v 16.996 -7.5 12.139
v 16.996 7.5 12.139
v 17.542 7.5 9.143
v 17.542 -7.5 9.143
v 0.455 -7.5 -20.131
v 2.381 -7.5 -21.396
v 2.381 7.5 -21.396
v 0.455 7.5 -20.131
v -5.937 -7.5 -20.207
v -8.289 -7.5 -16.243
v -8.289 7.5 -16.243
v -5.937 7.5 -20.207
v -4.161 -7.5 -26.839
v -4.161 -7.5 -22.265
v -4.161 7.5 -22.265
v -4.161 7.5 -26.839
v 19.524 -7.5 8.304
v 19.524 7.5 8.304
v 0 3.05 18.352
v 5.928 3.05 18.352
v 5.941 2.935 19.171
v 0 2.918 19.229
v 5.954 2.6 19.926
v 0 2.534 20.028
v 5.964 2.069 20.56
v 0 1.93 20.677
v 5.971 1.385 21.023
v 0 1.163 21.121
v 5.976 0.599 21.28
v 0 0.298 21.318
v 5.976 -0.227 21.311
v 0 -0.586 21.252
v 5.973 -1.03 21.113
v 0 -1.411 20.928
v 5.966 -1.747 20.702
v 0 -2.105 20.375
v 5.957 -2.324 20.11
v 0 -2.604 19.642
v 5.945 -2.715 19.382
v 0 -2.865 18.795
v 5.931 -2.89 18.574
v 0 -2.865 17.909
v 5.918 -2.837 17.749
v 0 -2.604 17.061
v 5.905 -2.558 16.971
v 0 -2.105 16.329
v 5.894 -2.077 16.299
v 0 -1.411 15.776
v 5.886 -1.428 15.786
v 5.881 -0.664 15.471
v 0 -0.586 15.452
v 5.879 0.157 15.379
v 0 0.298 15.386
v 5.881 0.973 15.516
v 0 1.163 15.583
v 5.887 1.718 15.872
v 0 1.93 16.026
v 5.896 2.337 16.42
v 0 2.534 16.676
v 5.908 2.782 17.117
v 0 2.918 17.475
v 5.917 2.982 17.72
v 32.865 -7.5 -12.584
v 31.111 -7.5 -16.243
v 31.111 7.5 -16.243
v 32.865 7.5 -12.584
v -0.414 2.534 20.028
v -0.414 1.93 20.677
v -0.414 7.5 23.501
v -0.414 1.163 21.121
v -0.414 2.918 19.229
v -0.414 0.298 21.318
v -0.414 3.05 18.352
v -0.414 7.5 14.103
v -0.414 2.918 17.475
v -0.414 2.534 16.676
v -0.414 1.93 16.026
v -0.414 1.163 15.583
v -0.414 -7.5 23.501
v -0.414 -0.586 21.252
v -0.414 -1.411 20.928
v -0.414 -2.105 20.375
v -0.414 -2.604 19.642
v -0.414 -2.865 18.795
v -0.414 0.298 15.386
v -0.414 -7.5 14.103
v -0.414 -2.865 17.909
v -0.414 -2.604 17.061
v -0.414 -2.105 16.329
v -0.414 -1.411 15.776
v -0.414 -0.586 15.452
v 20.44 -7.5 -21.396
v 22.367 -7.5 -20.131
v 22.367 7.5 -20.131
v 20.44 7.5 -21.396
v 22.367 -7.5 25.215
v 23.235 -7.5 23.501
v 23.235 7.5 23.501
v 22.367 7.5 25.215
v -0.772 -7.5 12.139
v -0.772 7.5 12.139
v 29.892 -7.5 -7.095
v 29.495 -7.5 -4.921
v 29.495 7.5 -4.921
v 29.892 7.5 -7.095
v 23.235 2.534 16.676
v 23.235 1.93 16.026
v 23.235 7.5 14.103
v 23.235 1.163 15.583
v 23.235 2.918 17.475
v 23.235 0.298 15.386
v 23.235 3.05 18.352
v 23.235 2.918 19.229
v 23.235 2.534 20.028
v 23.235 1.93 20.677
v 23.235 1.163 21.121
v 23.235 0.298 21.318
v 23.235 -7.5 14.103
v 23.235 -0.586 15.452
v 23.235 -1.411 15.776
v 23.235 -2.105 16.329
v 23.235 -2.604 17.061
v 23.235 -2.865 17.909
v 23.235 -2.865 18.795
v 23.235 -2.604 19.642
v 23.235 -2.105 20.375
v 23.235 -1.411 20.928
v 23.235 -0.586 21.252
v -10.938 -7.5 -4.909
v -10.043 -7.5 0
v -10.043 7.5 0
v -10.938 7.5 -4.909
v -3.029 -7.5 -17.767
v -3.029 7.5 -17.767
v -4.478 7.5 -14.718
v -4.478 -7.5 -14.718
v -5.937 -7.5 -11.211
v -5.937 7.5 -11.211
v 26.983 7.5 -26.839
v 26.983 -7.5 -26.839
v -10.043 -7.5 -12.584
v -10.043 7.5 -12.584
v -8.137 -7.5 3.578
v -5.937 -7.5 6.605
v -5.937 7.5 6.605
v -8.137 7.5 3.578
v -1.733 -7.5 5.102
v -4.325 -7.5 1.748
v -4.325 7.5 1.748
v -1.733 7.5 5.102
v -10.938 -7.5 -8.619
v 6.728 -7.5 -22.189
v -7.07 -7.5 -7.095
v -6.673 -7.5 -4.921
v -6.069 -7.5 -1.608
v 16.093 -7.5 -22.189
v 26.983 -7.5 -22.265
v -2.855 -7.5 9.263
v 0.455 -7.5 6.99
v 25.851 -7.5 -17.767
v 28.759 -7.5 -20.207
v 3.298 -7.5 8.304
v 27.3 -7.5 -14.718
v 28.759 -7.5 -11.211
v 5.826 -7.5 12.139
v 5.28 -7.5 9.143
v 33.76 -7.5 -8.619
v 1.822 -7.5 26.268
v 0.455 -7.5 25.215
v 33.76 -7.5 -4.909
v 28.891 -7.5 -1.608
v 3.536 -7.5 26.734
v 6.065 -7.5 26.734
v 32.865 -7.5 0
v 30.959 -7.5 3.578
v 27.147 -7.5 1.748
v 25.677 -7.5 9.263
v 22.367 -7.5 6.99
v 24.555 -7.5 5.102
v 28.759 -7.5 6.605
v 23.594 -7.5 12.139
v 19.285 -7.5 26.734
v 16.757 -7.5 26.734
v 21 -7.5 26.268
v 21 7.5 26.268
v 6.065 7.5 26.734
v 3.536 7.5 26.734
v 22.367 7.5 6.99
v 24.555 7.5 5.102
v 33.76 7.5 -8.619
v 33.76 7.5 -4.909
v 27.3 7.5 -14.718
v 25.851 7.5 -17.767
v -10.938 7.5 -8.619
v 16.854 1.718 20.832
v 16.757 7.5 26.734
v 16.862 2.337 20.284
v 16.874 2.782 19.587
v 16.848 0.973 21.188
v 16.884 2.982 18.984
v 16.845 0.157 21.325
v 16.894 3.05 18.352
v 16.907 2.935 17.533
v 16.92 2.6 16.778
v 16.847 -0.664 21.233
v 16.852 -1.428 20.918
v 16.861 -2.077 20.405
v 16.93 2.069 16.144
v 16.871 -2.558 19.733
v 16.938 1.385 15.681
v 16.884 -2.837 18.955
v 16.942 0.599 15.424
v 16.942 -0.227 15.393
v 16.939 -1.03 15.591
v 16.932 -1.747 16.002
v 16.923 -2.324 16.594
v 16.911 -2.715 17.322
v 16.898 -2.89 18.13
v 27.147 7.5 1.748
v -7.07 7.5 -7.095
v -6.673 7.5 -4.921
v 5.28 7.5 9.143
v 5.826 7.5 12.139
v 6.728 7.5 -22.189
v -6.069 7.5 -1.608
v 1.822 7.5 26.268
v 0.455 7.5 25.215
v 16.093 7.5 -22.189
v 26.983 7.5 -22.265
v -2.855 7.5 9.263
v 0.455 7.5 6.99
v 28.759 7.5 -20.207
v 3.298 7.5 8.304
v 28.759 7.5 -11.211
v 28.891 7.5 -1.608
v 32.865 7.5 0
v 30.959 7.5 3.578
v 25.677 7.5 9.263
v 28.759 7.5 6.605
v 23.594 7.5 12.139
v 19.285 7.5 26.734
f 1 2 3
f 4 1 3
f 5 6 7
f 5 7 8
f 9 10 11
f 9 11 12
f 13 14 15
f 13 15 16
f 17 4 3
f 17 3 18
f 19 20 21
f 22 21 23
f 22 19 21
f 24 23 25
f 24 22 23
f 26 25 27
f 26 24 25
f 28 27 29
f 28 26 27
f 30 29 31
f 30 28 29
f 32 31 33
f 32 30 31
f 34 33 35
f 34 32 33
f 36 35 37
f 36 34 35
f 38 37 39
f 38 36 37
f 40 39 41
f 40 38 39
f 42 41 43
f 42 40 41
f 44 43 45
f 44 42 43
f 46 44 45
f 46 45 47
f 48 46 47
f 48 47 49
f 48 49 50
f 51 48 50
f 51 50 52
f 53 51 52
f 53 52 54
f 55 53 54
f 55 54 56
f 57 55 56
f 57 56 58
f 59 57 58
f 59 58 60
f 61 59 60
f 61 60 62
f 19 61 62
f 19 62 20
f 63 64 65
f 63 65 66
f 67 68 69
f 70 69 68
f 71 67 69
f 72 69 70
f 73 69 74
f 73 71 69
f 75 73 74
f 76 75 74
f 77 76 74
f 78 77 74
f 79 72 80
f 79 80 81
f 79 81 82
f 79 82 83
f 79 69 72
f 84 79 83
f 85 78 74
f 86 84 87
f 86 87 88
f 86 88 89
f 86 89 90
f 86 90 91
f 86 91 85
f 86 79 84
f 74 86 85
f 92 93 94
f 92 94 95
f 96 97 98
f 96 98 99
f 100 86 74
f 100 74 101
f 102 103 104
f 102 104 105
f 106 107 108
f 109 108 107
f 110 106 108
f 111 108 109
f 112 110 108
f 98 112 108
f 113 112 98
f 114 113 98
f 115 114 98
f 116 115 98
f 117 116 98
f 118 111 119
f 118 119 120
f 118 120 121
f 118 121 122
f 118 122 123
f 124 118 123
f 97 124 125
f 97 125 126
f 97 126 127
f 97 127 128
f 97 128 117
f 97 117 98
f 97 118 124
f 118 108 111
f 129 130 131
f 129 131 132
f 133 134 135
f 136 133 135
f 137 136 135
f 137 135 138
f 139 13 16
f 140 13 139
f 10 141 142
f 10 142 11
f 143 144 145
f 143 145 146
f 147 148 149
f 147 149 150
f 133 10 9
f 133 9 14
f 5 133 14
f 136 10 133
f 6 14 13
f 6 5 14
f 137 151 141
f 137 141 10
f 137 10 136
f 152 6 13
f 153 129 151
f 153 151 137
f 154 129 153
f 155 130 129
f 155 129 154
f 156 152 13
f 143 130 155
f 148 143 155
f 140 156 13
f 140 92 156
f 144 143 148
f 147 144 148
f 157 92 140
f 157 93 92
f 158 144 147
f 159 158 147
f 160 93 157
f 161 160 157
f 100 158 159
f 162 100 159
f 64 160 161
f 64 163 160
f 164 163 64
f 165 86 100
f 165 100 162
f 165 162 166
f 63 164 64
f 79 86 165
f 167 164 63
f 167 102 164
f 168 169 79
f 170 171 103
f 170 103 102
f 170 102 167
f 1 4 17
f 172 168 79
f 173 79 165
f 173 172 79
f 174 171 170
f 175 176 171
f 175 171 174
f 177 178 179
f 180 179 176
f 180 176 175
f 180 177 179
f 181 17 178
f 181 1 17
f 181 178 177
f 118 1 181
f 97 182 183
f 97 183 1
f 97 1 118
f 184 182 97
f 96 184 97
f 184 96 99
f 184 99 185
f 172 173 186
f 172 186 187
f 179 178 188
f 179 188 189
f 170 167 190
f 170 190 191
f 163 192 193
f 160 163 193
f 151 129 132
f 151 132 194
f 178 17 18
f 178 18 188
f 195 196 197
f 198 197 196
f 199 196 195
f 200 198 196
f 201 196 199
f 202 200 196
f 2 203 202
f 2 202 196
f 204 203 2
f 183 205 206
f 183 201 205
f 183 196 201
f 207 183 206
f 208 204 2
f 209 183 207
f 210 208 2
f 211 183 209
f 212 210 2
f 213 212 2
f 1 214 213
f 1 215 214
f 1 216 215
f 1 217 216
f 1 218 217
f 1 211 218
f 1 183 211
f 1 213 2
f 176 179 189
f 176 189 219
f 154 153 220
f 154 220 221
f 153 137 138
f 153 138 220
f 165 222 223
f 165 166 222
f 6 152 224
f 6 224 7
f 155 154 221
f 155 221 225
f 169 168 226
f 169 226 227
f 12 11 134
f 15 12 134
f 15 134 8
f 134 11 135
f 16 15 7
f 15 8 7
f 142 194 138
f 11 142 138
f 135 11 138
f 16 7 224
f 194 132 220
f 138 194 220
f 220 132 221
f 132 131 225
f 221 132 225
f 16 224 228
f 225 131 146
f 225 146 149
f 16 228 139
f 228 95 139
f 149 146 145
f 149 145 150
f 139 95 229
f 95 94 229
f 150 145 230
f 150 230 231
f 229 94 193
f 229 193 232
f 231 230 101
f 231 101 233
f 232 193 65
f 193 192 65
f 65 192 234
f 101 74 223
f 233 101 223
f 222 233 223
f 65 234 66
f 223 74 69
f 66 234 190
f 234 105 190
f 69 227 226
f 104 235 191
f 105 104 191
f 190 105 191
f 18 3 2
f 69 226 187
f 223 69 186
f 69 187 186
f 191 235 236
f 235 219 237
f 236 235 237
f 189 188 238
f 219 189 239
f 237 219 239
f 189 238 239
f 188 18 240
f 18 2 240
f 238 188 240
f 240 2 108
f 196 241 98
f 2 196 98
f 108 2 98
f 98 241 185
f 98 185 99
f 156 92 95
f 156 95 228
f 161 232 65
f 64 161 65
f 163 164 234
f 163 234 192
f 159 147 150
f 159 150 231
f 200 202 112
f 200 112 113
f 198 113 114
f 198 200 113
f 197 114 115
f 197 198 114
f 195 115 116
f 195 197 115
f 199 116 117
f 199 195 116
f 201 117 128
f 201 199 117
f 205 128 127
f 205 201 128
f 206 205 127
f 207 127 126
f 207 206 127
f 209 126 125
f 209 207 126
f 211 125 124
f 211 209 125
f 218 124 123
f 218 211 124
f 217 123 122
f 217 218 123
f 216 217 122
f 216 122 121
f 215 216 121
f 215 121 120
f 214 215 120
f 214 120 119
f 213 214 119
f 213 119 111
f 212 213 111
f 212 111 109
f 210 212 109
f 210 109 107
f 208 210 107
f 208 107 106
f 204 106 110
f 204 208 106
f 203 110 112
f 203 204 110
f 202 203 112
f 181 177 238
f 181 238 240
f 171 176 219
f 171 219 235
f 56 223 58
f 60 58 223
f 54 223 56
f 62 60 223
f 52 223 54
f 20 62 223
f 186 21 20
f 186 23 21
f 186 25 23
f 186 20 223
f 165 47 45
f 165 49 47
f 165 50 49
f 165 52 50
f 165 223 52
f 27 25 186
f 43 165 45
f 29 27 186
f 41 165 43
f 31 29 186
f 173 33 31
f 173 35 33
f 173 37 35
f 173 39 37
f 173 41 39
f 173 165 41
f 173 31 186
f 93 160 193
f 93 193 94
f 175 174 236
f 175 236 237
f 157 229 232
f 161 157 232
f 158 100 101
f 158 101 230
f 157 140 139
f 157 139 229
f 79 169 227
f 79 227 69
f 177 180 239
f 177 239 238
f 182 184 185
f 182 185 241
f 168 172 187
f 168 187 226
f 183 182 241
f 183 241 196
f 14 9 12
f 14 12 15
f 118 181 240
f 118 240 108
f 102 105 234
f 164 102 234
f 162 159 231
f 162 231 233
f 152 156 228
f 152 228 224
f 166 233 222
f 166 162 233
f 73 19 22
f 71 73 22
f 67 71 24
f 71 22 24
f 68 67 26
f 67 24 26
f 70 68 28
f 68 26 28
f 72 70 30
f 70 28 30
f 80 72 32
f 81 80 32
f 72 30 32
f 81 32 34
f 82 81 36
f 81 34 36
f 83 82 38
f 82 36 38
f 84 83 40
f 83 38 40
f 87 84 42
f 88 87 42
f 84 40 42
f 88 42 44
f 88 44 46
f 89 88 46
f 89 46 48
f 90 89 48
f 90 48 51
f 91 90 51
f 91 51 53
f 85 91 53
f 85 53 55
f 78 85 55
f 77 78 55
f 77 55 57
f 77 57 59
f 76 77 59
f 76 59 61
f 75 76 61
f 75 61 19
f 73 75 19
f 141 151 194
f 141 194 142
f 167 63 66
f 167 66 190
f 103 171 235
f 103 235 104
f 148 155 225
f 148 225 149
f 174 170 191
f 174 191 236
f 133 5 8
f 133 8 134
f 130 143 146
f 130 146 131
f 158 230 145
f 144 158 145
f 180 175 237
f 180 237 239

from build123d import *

# Parameters (mm, degrees)
F1_DEPTH = 7.5
F2_R     = 2.974485
F3_DEPTH = 33.760661
F4_R     = 2.974485
F5_DEPTH = 10.938791


with BuildPart() as f1:
    # F0 (on Front) → F1 (new body, symmetric)
    with BuildSketch(Plane.XZ):
        Polygon((5.826252, 12.139047), (6.064818, 26.734496), (3.536387, 26.734496), (1.821829, 26.267877), (0.454524, 25.215268), (-0.413607, 23.500709), (-0.413607, 14.103194), (-0.771711, 12.139047), (-2.855225, 9.263365), (-5.937089, 6.604715), (-8.137005, 3.577773), (-10.042827, 0), (-10.937791, -4.908744), (-10.937791, -8.619478), (-10.042827, -12.583584), (-8.289473, -16.242759), (-5.937089, -20.206865), (-4.16116, -22.265492), (-4.16116, -26.83912), (11.410935, -26.83912), (11.410935, -22.188919), (6.728393, -22.188919), (2.381469, -21.396385), (0.454524, -20.130632), (-3.029408, -17.767416), (-4.477831, -14.718102), (-5.937089, -11.211392), (-7.069747, -7.09482), (-6.673481, -4.921359), (-6.069345, -1.607767), (-4.325366, 1.748186), (-1.733449, 5.10243), (0.454524, 6.989942), (3.297916, 8.304209), (5.279969, 9.14277), align=None)
        Polygon((16.093477, -22.188919), (11.410935, -22.188919), (11.410935, -26.83912), (26.98303, -26.83912), (26.98303, -22.265492), (28.758958, -20.206865), (31.111343, -16.242759), (32.864696, -12.583584), (33.759661, -8.619478), (33.759661, -4.908744), (32.864696, 0), (30.958875, 3.577773), (28.758958, 6.604715), (25.677094, 9.263365), (23.593581, 12.139047), (23.235477, 14.103194), (23.235477, 23.500709), (22.367346, 25.215268), (21.00004, 26.267877), (19.285482, 26.734496), (16.757051, 26.734496), (16.995617, 12.139047), (17.5419, 9.14277), (19.523954, 8.304209), (22.367346, 6.989942), (24.555319, 5.10243), (27.147235, 1.748186), (28.891215, -1.607767), (29.495351, -4.921359), (29.891617, -7.09482), (28.758958, -11.211392), (27.2997, -14.718102), (25.851278, -17.767416), (22.367346, -20.130632), (20.440401, -21.396385), align=None)
    extrude(amount=F1_DEPTH, both=True)

    # F2 (on Right) → F3 (cut, through all)
    with BuildSketch(Plane.YZ):
        with Locations((0.075872, 18.351913)):
            Circle(F2_R)
    extrude(amount=F3_DEPTH, mode=Mode.SUBTRACT)

    # F4 (on face) → F5 (cut, through all)
    with BuildSketch(Plane.YZ):
        with Locations((0.075872, 18.351913)):
            Circle(F4_R)
    extrude(amount=-F5_DEPTH, mode=Mode.SUBTRACT)


solid = f1.part
